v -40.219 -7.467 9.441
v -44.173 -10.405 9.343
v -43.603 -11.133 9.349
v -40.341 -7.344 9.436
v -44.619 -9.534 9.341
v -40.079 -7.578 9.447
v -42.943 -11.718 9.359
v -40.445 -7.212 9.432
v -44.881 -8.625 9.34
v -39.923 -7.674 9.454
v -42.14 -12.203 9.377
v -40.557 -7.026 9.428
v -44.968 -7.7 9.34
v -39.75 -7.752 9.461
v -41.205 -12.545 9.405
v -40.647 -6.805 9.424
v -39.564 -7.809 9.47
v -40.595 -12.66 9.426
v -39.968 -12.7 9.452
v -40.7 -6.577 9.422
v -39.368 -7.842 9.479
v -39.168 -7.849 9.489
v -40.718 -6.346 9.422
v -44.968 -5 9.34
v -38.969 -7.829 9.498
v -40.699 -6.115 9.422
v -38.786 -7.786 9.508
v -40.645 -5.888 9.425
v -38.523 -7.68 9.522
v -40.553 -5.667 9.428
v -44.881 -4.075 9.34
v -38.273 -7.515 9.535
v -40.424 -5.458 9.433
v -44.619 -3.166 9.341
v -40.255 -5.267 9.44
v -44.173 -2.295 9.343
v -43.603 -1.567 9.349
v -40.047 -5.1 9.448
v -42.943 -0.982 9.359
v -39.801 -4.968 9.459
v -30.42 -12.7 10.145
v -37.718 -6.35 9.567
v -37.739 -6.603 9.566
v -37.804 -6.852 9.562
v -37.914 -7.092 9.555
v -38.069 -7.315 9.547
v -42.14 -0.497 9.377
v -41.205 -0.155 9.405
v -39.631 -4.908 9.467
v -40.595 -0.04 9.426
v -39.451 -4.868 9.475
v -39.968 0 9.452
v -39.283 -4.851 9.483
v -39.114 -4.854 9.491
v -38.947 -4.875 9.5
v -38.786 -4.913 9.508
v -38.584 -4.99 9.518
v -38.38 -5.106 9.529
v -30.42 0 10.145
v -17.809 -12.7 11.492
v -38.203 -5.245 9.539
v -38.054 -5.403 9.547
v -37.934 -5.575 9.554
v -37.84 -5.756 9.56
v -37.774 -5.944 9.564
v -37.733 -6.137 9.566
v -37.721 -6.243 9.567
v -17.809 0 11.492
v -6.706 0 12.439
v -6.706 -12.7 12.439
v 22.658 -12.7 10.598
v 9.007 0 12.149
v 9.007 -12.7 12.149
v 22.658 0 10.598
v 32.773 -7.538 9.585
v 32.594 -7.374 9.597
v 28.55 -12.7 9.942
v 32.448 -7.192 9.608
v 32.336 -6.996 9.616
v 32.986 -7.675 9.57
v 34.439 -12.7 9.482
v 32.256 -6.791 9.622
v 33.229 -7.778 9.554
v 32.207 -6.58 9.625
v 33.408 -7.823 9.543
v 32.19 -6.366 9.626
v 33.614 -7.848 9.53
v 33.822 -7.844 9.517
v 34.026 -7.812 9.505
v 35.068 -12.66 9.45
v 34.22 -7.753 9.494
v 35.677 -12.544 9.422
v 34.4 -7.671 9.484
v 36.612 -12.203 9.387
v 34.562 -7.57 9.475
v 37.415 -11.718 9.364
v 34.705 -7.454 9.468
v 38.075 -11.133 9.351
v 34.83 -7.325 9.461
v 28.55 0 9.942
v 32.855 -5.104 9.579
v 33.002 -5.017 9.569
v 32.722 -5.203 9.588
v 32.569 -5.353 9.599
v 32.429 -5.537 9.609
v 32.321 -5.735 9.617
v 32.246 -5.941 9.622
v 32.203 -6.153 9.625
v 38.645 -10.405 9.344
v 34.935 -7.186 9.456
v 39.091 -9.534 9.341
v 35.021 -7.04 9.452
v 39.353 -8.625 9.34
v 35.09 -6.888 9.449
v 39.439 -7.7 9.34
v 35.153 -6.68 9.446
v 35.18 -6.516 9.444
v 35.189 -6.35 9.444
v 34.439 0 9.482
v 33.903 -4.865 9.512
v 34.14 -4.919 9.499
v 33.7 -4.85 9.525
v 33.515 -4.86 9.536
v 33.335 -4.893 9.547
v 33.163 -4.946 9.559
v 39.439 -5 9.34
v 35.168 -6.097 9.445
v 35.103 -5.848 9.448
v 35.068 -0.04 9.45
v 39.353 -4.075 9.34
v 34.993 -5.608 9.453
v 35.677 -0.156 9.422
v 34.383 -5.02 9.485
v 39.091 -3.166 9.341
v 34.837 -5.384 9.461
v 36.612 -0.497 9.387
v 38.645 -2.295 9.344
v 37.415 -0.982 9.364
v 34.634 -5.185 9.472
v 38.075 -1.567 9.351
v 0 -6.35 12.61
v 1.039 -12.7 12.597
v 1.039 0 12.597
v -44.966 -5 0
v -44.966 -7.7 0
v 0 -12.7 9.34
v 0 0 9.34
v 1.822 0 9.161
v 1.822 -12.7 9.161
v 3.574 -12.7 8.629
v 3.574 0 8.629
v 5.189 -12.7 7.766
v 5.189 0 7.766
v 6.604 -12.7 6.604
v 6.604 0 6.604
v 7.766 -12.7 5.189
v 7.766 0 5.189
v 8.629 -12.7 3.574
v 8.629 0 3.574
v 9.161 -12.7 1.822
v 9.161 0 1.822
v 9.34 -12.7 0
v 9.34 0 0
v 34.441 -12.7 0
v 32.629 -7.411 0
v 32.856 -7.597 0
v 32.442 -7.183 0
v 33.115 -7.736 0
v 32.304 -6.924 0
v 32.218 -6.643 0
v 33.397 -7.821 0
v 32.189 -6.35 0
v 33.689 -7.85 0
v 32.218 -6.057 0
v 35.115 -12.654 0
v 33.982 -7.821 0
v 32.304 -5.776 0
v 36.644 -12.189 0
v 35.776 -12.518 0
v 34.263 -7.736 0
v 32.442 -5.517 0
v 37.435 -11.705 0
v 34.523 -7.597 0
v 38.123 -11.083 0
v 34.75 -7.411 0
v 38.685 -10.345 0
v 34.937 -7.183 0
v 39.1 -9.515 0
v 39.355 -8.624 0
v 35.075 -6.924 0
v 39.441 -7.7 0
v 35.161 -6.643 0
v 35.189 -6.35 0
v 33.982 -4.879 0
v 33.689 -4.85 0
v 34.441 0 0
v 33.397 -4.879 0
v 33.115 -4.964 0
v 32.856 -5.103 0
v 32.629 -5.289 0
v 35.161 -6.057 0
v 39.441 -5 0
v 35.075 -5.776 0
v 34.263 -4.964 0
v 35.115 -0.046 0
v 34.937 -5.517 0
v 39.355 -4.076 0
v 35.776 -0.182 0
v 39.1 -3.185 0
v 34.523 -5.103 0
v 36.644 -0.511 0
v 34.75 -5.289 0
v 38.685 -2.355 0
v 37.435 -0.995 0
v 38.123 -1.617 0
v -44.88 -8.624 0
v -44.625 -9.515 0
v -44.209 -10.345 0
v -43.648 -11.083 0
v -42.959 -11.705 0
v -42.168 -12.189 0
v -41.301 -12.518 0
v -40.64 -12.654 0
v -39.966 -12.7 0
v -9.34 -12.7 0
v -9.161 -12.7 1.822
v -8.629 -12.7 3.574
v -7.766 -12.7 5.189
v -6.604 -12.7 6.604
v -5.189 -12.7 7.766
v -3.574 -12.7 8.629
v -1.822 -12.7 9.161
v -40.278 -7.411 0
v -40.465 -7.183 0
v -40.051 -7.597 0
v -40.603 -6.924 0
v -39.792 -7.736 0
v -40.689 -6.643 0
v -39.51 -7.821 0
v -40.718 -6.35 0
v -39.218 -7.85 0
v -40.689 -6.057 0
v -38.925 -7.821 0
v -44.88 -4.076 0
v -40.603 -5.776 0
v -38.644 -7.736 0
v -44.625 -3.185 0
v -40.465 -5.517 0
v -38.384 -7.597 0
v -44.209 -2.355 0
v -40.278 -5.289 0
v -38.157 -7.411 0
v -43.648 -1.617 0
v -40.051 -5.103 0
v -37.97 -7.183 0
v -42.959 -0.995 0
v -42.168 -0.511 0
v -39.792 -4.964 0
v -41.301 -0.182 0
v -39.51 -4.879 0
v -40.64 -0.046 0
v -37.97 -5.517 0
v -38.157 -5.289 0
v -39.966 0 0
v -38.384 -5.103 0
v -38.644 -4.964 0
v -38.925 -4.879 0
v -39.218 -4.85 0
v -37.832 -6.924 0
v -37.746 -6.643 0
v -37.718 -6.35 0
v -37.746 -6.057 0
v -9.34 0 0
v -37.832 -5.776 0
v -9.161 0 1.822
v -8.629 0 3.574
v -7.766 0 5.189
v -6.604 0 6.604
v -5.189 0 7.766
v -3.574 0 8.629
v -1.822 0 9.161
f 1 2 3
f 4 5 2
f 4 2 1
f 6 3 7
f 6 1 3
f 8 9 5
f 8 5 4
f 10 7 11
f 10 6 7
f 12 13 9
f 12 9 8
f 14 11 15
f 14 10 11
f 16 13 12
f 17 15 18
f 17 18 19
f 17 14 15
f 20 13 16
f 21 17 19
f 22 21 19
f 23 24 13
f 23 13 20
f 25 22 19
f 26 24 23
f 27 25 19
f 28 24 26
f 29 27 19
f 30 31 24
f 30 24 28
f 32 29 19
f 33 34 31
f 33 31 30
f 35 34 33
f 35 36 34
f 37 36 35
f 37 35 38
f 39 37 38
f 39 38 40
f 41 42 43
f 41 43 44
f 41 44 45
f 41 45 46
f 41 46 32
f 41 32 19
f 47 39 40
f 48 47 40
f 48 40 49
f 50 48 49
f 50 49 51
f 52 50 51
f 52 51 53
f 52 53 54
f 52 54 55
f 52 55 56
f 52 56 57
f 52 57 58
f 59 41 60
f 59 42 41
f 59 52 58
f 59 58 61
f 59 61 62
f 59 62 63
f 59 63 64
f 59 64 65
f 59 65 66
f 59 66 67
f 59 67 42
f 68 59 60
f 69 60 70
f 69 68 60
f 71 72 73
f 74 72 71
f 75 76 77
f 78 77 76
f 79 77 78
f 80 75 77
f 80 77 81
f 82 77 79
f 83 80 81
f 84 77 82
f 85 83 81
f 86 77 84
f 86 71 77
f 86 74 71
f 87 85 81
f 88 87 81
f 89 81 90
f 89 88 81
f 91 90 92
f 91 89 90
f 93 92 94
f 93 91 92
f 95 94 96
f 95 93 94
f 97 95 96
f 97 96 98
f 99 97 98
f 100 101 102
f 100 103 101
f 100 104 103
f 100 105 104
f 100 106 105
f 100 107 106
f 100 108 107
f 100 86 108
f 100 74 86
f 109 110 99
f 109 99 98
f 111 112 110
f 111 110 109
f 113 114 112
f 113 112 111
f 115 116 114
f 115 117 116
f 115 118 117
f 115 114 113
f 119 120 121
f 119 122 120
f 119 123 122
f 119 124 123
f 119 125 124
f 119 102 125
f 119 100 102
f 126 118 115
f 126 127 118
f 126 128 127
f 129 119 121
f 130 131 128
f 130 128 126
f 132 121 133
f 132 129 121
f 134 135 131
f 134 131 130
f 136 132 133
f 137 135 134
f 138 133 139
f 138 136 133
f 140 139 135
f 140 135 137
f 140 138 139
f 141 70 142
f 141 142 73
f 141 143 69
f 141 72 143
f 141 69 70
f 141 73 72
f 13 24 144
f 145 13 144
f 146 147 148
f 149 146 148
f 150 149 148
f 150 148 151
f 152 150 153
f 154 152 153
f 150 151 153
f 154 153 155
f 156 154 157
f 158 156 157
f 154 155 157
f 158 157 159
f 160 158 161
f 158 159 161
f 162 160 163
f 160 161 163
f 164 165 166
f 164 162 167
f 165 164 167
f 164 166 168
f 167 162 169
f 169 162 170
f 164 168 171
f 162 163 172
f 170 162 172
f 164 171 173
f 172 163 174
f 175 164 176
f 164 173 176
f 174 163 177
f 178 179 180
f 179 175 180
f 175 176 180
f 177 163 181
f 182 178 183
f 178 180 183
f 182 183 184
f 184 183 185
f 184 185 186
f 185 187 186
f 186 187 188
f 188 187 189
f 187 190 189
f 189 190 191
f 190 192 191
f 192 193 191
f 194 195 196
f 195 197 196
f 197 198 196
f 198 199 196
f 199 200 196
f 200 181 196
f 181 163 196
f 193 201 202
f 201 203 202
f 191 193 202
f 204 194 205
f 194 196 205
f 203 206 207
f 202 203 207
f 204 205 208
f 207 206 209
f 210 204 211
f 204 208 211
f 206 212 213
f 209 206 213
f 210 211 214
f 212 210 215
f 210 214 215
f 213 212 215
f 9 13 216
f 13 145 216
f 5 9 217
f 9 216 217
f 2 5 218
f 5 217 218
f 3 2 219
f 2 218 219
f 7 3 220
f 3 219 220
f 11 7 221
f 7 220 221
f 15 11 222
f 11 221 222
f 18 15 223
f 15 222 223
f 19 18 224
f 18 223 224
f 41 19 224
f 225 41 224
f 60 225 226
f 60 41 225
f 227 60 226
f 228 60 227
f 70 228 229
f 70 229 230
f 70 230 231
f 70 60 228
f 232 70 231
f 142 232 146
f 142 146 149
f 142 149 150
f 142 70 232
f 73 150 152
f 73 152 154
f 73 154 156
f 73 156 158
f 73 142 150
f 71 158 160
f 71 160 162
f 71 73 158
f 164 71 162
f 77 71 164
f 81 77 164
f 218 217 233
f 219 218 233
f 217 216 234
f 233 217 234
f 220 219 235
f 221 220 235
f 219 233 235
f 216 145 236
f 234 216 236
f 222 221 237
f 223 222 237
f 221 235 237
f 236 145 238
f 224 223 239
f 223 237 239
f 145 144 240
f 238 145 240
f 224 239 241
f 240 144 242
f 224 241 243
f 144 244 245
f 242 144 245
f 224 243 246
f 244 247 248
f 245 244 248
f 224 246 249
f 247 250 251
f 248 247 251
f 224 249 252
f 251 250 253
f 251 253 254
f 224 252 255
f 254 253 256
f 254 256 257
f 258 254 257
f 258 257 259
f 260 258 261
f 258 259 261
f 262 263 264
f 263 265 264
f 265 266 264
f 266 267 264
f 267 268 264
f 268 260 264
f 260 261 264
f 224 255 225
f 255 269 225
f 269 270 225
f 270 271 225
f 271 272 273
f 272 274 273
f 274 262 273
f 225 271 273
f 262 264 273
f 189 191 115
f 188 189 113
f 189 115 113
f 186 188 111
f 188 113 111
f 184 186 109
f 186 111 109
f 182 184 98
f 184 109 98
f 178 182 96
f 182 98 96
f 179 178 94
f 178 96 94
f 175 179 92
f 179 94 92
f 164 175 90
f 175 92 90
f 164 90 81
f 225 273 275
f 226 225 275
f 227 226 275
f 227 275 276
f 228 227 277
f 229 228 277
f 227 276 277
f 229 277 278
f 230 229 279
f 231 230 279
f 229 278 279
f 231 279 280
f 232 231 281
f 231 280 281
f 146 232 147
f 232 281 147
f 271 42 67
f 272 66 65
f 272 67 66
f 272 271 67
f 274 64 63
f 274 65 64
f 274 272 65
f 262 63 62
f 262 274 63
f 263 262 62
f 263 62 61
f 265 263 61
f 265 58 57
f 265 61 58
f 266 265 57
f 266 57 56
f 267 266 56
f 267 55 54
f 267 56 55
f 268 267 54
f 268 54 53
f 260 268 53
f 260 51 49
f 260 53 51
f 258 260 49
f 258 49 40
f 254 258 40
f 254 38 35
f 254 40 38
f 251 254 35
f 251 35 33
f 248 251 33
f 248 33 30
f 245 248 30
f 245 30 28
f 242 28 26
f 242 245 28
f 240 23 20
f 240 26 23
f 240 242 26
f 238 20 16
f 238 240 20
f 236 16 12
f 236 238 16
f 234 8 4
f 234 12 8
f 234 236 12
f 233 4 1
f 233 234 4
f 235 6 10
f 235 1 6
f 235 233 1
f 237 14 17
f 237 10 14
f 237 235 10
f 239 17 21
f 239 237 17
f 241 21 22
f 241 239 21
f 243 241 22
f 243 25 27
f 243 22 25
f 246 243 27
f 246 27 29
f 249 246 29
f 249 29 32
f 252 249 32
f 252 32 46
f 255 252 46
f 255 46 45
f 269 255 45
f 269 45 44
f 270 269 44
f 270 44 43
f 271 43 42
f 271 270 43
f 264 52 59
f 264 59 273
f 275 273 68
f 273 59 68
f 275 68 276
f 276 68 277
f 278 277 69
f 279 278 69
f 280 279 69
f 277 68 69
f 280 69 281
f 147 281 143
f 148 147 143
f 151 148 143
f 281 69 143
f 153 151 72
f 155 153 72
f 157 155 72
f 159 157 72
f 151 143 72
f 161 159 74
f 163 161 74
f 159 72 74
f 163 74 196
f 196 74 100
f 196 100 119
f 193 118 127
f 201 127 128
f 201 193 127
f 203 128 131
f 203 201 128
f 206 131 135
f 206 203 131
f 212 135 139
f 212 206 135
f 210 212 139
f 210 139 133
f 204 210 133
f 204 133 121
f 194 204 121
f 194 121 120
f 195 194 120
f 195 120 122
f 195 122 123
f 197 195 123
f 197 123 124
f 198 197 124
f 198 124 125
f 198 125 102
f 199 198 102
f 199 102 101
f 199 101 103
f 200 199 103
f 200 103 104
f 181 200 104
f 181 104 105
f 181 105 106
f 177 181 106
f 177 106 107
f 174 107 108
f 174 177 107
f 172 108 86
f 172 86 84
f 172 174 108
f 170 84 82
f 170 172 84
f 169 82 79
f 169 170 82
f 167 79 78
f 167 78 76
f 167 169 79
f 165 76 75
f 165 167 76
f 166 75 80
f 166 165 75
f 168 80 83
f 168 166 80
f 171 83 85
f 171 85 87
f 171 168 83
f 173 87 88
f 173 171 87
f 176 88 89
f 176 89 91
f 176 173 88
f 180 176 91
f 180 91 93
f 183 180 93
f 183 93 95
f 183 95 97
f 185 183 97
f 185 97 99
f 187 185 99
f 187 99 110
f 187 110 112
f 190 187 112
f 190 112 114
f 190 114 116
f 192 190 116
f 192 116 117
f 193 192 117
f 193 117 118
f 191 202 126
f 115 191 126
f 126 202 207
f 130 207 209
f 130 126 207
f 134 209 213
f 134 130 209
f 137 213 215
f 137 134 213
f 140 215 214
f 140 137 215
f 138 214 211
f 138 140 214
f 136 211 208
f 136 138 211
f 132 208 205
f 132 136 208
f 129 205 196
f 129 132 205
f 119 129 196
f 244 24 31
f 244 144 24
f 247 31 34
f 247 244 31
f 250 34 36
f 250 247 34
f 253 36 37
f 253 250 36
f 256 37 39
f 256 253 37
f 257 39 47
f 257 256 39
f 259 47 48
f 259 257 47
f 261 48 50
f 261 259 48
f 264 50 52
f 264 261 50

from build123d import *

# Parameters (mm, degrees)
F1_DEPTH = 12.7
F2_R     = 5
F3_R     = 1.5
F4_DEPTH = 19.1


with BuildPart() as f1:
    # F0 (on Front) → F1 (new body)
    with BuildSketch(Plane.XZ):
        with BuildLine():
            Line((9.34, 0), (39.4412088344, 0))
            Line((39.4412088344, 0), (39.4394582065, 9.3399980128))
            Line((39.4394582065, 9.3399980128), (0, 9.34))
            ThreePointArc((0, 9.34), (6.6043773363, 6.6043773363), (9.34, 0))
        make_face()
        with BuildLine():
            Line((0, 9.34), (39.4394582065, 9.3399980128))
            add(Edge.make_bspline(
                [(-44.9675657917, 9.3399980128), (-29.6900332628, 9.339998688), (-0.1580063373, 15.8879383906), (26.3566872689, 9.339998672), (39.4394582065, 9.3399980128)],
                knots=[0, 0, 0, 0, 0.5162924895, 1, 1, 1, 1], degree=3))
            Line((-44.9675657917, 9.3399980128), (0, 9.34))
        make_face()
        with BuildLine():
            ThreePointArc((-9.34, 0), (-6.6043773363, 6.6043773363), (0, 9.34))
            Line((0, 9.34), (-44.9675657917, 9.3399980128))
            Line((-44.9675657917, 9.3399980128), (-44.9658151637, 0))
            Line((-44.9658151637, 0), (-9.34, 0))
        make_face()
    extrude(amount=F1_DEPTH)

    # F2
    f2_edges = [f1.edges().sort_by_distance(p)[0] for p in [
        (-44.96669, -12.7, 4.669999),
        (-44.96669, 0, 4.669999),
        (39.440334, -12.7, 4.669999),
        (39.440334, 0, 4.669999),
    ]]
    fillet(f2_edges, radius=F2_R)

    # F3 (on Top) → F4 (cut)
    with BuildSketch(Plane.XY):
        with Locations((-39.2175657917, -6.35)):
            Circle(F3_R)
        with Locations((33.6894582065, -6.35)):
            Circle(F3_R)
    extrude(amount=F4_DEPTH, mode=Mode.SUBTRACT)


solid = f1.part
